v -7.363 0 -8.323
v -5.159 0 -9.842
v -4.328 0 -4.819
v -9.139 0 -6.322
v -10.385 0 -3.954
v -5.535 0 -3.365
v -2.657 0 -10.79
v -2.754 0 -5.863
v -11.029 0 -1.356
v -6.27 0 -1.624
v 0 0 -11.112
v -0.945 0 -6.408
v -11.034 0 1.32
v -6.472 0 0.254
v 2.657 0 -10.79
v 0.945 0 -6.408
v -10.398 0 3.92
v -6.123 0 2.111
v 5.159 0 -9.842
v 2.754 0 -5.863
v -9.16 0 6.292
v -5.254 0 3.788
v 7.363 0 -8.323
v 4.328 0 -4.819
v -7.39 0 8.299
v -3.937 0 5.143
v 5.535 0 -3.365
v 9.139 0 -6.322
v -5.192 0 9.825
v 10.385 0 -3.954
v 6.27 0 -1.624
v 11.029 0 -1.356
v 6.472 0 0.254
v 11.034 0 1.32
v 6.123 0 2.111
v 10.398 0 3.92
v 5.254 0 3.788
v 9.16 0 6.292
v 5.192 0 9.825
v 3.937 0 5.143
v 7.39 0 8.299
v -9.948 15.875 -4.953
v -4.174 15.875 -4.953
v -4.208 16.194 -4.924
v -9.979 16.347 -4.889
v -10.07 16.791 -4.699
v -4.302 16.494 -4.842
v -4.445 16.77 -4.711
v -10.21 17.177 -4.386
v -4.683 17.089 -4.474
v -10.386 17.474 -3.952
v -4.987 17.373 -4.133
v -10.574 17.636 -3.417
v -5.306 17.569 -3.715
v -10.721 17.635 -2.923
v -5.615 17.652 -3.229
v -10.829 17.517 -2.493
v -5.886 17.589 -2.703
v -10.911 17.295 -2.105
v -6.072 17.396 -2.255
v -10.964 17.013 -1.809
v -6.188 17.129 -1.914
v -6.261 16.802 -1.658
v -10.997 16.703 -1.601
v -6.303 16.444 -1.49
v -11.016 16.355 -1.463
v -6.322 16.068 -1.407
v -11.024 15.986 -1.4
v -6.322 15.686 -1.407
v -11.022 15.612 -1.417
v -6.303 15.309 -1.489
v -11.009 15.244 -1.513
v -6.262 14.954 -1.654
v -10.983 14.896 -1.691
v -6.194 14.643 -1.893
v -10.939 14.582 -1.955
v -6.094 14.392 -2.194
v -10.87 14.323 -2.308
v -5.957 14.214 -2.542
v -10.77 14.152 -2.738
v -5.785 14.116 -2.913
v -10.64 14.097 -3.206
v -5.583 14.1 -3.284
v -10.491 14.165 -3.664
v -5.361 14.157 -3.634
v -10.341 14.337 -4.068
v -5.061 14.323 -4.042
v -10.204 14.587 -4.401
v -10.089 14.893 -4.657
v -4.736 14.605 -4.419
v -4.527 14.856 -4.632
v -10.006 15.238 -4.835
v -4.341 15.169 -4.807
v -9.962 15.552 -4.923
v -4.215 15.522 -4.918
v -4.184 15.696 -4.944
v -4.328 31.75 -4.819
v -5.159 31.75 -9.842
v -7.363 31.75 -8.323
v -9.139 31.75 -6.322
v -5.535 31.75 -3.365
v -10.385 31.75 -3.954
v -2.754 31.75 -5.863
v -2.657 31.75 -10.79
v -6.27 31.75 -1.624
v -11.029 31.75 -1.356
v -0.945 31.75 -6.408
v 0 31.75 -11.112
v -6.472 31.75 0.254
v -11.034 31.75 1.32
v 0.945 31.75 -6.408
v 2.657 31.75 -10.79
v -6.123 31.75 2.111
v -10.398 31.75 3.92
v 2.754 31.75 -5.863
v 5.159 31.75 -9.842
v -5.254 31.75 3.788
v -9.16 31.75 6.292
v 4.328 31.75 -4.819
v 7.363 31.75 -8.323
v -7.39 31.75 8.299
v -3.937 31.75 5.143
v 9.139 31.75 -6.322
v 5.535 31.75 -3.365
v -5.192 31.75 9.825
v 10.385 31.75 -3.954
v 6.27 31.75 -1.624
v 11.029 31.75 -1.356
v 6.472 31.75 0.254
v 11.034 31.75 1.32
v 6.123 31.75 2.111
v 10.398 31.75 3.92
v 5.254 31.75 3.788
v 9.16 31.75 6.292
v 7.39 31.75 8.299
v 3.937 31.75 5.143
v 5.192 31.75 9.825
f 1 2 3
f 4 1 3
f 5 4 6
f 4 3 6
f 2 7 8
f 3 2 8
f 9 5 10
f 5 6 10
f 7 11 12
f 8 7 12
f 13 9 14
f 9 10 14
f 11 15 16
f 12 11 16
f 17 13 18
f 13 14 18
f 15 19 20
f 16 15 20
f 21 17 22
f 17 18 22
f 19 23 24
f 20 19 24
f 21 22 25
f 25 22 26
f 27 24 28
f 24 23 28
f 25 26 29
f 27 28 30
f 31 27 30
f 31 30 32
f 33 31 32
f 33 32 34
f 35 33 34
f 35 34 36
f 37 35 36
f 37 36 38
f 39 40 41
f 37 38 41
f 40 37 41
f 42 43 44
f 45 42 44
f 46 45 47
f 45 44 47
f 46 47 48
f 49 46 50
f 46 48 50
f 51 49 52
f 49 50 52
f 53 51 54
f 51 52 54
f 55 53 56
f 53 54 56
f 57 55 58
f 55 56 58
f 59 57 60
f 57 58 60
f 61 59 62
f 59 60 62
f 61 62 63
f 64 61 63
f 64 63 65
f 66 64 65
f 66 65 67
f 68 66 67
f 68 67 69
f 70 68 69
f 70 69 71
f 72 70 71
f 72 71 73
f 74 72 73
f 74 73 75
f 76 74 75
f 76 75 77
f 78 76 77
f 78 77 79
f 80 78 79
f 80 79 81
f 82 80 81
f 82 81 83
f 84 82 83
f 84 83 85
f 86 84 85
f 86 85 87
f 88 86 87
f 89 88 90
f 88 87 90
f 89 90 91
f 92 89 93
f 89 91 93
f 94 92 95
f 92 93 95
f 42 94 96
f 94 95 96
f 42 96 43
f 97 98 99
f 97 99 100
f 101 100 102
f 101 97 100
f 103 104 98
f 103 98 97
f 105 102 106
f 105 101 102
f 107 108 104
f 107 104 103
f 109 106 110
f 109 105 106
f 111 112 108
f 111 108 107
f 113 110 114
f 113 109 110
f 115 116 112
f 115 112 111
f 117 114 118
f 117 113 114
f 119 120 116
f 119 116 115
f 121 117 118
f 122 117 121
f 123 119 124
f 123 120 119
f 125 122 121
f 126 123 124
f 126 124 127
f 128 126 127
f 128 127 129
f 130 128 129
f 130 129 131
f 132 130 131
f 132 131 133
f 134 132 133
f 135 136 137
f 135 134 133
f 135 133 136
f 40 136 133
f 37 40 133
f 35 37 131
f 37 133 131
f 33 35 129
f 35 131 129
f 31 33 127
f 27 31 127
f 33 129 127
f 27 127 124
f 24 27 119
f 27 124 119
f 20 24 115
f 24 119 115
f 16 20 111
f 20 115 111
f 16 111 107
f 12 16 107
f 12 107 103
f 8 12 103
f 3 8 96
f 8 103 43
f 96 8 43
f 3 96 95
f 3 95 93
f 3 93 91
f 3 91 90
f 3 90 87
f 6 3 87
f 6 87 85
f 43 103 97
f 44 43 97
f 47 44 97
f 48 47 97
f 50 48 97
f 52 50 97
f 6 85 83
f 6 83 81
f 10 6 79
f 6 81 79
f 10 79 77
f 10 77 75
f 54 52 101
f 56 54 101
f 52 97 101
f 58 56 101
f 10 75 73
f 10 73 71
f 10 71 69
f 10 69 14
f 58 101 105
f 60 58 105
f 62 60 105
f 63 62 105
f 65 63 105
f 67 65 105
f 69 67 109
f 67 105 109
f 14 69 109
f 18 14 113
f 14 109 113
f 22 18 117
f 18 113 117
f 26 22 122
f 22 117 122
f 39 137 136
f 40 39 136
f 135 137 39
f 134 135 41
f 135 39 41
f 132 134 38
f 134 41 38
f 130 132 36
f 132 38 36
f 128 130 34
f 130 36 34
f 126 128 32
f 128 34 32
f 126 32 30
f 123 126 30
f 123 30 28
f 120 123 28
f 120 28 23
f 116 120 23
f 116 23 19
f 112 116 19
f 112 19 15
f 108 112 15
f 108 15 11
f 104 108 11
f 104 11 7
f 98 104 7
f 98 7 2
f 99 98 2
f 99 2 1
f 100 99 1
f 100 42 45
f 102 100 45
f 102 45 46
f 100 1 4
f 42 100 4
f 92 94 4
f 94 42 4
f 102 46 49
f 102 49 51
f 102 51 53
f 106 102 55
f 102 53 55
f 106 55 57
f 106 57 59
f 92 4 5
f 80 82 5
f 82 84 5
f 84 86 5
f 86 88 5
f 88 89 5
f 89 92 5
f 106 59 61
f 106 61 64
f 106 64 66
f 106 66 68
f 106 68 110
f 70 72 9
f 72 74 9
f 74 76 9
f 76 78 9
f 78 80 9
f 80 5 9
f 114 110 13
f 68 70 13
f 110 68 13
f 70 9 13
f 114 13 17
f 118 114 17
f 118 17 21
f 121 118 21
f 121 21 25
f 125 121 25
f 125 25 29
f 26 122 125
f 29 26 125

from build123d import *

# Parameters (mm, degrees)
SKETCH1_R           = 11.1125
BOSS_EXTRUDE1_DEPTH = 31.75
CUT_EXTRUDE1_DEPTH  = 36.426512847
SKETCH3_R           = 1.778
CUT_EXTRUDE2_DEPTH  = 31.75


with BuildPart() as part:
    # Sketch1 → Boss-Extrude1 (new body)
    with BuildSketch(Plane(origin=(0, 0, 0), x_dir=(1, 0, 0), z_dir=(0, 1, 0))):
        with Locations(Location((0, 0, 0), (0, 0, 270))):
            Circle(SKETCH1_R)
    extrude(amount=BOSS_EXTRUDE1_DEPTH)

    # Sketch2 → Cut-Extrude1 (cut, through all)
    with BuildSketch(Plane(origin=(0, 31.75, 0), x_dir=(1, 0, 0), z_dir=(0, 1, 0))):
        with BuildLine():
            Line((-3.937, -5.14310801), (-5.191572052, -9.825234648))
            ThreePointArc((-5.191572052, -9.825234648), (0, -11.1125), (5.191572052, -9.825234648))
            Line((5.191572052, -9.825234648), (3.937, -5.14310801))
            ThreePointArc((3.937, -5.14310801), (0, 6.477), (-3.937, -5.14310801))
        make_face()
    extrude(amount=-CUT_EXTRUDE1_DEPTH, mode=Mode.SUBTRACT)

    # Sketch3 → Cut-Extrude2 (cut)
    with BuildSketch(Plane(origin=(0, 0, 0), x_dir=(0, 0, -1), z_dir=(1, 0, 0))):
        with Locations((3.175, 15.875)):
            Circle(SKETCH3_R)
    extrude(amount=-CUT_EXTRUDE2_DEPTH, mode=Mode.SUBTRACT)


solid = part.part
